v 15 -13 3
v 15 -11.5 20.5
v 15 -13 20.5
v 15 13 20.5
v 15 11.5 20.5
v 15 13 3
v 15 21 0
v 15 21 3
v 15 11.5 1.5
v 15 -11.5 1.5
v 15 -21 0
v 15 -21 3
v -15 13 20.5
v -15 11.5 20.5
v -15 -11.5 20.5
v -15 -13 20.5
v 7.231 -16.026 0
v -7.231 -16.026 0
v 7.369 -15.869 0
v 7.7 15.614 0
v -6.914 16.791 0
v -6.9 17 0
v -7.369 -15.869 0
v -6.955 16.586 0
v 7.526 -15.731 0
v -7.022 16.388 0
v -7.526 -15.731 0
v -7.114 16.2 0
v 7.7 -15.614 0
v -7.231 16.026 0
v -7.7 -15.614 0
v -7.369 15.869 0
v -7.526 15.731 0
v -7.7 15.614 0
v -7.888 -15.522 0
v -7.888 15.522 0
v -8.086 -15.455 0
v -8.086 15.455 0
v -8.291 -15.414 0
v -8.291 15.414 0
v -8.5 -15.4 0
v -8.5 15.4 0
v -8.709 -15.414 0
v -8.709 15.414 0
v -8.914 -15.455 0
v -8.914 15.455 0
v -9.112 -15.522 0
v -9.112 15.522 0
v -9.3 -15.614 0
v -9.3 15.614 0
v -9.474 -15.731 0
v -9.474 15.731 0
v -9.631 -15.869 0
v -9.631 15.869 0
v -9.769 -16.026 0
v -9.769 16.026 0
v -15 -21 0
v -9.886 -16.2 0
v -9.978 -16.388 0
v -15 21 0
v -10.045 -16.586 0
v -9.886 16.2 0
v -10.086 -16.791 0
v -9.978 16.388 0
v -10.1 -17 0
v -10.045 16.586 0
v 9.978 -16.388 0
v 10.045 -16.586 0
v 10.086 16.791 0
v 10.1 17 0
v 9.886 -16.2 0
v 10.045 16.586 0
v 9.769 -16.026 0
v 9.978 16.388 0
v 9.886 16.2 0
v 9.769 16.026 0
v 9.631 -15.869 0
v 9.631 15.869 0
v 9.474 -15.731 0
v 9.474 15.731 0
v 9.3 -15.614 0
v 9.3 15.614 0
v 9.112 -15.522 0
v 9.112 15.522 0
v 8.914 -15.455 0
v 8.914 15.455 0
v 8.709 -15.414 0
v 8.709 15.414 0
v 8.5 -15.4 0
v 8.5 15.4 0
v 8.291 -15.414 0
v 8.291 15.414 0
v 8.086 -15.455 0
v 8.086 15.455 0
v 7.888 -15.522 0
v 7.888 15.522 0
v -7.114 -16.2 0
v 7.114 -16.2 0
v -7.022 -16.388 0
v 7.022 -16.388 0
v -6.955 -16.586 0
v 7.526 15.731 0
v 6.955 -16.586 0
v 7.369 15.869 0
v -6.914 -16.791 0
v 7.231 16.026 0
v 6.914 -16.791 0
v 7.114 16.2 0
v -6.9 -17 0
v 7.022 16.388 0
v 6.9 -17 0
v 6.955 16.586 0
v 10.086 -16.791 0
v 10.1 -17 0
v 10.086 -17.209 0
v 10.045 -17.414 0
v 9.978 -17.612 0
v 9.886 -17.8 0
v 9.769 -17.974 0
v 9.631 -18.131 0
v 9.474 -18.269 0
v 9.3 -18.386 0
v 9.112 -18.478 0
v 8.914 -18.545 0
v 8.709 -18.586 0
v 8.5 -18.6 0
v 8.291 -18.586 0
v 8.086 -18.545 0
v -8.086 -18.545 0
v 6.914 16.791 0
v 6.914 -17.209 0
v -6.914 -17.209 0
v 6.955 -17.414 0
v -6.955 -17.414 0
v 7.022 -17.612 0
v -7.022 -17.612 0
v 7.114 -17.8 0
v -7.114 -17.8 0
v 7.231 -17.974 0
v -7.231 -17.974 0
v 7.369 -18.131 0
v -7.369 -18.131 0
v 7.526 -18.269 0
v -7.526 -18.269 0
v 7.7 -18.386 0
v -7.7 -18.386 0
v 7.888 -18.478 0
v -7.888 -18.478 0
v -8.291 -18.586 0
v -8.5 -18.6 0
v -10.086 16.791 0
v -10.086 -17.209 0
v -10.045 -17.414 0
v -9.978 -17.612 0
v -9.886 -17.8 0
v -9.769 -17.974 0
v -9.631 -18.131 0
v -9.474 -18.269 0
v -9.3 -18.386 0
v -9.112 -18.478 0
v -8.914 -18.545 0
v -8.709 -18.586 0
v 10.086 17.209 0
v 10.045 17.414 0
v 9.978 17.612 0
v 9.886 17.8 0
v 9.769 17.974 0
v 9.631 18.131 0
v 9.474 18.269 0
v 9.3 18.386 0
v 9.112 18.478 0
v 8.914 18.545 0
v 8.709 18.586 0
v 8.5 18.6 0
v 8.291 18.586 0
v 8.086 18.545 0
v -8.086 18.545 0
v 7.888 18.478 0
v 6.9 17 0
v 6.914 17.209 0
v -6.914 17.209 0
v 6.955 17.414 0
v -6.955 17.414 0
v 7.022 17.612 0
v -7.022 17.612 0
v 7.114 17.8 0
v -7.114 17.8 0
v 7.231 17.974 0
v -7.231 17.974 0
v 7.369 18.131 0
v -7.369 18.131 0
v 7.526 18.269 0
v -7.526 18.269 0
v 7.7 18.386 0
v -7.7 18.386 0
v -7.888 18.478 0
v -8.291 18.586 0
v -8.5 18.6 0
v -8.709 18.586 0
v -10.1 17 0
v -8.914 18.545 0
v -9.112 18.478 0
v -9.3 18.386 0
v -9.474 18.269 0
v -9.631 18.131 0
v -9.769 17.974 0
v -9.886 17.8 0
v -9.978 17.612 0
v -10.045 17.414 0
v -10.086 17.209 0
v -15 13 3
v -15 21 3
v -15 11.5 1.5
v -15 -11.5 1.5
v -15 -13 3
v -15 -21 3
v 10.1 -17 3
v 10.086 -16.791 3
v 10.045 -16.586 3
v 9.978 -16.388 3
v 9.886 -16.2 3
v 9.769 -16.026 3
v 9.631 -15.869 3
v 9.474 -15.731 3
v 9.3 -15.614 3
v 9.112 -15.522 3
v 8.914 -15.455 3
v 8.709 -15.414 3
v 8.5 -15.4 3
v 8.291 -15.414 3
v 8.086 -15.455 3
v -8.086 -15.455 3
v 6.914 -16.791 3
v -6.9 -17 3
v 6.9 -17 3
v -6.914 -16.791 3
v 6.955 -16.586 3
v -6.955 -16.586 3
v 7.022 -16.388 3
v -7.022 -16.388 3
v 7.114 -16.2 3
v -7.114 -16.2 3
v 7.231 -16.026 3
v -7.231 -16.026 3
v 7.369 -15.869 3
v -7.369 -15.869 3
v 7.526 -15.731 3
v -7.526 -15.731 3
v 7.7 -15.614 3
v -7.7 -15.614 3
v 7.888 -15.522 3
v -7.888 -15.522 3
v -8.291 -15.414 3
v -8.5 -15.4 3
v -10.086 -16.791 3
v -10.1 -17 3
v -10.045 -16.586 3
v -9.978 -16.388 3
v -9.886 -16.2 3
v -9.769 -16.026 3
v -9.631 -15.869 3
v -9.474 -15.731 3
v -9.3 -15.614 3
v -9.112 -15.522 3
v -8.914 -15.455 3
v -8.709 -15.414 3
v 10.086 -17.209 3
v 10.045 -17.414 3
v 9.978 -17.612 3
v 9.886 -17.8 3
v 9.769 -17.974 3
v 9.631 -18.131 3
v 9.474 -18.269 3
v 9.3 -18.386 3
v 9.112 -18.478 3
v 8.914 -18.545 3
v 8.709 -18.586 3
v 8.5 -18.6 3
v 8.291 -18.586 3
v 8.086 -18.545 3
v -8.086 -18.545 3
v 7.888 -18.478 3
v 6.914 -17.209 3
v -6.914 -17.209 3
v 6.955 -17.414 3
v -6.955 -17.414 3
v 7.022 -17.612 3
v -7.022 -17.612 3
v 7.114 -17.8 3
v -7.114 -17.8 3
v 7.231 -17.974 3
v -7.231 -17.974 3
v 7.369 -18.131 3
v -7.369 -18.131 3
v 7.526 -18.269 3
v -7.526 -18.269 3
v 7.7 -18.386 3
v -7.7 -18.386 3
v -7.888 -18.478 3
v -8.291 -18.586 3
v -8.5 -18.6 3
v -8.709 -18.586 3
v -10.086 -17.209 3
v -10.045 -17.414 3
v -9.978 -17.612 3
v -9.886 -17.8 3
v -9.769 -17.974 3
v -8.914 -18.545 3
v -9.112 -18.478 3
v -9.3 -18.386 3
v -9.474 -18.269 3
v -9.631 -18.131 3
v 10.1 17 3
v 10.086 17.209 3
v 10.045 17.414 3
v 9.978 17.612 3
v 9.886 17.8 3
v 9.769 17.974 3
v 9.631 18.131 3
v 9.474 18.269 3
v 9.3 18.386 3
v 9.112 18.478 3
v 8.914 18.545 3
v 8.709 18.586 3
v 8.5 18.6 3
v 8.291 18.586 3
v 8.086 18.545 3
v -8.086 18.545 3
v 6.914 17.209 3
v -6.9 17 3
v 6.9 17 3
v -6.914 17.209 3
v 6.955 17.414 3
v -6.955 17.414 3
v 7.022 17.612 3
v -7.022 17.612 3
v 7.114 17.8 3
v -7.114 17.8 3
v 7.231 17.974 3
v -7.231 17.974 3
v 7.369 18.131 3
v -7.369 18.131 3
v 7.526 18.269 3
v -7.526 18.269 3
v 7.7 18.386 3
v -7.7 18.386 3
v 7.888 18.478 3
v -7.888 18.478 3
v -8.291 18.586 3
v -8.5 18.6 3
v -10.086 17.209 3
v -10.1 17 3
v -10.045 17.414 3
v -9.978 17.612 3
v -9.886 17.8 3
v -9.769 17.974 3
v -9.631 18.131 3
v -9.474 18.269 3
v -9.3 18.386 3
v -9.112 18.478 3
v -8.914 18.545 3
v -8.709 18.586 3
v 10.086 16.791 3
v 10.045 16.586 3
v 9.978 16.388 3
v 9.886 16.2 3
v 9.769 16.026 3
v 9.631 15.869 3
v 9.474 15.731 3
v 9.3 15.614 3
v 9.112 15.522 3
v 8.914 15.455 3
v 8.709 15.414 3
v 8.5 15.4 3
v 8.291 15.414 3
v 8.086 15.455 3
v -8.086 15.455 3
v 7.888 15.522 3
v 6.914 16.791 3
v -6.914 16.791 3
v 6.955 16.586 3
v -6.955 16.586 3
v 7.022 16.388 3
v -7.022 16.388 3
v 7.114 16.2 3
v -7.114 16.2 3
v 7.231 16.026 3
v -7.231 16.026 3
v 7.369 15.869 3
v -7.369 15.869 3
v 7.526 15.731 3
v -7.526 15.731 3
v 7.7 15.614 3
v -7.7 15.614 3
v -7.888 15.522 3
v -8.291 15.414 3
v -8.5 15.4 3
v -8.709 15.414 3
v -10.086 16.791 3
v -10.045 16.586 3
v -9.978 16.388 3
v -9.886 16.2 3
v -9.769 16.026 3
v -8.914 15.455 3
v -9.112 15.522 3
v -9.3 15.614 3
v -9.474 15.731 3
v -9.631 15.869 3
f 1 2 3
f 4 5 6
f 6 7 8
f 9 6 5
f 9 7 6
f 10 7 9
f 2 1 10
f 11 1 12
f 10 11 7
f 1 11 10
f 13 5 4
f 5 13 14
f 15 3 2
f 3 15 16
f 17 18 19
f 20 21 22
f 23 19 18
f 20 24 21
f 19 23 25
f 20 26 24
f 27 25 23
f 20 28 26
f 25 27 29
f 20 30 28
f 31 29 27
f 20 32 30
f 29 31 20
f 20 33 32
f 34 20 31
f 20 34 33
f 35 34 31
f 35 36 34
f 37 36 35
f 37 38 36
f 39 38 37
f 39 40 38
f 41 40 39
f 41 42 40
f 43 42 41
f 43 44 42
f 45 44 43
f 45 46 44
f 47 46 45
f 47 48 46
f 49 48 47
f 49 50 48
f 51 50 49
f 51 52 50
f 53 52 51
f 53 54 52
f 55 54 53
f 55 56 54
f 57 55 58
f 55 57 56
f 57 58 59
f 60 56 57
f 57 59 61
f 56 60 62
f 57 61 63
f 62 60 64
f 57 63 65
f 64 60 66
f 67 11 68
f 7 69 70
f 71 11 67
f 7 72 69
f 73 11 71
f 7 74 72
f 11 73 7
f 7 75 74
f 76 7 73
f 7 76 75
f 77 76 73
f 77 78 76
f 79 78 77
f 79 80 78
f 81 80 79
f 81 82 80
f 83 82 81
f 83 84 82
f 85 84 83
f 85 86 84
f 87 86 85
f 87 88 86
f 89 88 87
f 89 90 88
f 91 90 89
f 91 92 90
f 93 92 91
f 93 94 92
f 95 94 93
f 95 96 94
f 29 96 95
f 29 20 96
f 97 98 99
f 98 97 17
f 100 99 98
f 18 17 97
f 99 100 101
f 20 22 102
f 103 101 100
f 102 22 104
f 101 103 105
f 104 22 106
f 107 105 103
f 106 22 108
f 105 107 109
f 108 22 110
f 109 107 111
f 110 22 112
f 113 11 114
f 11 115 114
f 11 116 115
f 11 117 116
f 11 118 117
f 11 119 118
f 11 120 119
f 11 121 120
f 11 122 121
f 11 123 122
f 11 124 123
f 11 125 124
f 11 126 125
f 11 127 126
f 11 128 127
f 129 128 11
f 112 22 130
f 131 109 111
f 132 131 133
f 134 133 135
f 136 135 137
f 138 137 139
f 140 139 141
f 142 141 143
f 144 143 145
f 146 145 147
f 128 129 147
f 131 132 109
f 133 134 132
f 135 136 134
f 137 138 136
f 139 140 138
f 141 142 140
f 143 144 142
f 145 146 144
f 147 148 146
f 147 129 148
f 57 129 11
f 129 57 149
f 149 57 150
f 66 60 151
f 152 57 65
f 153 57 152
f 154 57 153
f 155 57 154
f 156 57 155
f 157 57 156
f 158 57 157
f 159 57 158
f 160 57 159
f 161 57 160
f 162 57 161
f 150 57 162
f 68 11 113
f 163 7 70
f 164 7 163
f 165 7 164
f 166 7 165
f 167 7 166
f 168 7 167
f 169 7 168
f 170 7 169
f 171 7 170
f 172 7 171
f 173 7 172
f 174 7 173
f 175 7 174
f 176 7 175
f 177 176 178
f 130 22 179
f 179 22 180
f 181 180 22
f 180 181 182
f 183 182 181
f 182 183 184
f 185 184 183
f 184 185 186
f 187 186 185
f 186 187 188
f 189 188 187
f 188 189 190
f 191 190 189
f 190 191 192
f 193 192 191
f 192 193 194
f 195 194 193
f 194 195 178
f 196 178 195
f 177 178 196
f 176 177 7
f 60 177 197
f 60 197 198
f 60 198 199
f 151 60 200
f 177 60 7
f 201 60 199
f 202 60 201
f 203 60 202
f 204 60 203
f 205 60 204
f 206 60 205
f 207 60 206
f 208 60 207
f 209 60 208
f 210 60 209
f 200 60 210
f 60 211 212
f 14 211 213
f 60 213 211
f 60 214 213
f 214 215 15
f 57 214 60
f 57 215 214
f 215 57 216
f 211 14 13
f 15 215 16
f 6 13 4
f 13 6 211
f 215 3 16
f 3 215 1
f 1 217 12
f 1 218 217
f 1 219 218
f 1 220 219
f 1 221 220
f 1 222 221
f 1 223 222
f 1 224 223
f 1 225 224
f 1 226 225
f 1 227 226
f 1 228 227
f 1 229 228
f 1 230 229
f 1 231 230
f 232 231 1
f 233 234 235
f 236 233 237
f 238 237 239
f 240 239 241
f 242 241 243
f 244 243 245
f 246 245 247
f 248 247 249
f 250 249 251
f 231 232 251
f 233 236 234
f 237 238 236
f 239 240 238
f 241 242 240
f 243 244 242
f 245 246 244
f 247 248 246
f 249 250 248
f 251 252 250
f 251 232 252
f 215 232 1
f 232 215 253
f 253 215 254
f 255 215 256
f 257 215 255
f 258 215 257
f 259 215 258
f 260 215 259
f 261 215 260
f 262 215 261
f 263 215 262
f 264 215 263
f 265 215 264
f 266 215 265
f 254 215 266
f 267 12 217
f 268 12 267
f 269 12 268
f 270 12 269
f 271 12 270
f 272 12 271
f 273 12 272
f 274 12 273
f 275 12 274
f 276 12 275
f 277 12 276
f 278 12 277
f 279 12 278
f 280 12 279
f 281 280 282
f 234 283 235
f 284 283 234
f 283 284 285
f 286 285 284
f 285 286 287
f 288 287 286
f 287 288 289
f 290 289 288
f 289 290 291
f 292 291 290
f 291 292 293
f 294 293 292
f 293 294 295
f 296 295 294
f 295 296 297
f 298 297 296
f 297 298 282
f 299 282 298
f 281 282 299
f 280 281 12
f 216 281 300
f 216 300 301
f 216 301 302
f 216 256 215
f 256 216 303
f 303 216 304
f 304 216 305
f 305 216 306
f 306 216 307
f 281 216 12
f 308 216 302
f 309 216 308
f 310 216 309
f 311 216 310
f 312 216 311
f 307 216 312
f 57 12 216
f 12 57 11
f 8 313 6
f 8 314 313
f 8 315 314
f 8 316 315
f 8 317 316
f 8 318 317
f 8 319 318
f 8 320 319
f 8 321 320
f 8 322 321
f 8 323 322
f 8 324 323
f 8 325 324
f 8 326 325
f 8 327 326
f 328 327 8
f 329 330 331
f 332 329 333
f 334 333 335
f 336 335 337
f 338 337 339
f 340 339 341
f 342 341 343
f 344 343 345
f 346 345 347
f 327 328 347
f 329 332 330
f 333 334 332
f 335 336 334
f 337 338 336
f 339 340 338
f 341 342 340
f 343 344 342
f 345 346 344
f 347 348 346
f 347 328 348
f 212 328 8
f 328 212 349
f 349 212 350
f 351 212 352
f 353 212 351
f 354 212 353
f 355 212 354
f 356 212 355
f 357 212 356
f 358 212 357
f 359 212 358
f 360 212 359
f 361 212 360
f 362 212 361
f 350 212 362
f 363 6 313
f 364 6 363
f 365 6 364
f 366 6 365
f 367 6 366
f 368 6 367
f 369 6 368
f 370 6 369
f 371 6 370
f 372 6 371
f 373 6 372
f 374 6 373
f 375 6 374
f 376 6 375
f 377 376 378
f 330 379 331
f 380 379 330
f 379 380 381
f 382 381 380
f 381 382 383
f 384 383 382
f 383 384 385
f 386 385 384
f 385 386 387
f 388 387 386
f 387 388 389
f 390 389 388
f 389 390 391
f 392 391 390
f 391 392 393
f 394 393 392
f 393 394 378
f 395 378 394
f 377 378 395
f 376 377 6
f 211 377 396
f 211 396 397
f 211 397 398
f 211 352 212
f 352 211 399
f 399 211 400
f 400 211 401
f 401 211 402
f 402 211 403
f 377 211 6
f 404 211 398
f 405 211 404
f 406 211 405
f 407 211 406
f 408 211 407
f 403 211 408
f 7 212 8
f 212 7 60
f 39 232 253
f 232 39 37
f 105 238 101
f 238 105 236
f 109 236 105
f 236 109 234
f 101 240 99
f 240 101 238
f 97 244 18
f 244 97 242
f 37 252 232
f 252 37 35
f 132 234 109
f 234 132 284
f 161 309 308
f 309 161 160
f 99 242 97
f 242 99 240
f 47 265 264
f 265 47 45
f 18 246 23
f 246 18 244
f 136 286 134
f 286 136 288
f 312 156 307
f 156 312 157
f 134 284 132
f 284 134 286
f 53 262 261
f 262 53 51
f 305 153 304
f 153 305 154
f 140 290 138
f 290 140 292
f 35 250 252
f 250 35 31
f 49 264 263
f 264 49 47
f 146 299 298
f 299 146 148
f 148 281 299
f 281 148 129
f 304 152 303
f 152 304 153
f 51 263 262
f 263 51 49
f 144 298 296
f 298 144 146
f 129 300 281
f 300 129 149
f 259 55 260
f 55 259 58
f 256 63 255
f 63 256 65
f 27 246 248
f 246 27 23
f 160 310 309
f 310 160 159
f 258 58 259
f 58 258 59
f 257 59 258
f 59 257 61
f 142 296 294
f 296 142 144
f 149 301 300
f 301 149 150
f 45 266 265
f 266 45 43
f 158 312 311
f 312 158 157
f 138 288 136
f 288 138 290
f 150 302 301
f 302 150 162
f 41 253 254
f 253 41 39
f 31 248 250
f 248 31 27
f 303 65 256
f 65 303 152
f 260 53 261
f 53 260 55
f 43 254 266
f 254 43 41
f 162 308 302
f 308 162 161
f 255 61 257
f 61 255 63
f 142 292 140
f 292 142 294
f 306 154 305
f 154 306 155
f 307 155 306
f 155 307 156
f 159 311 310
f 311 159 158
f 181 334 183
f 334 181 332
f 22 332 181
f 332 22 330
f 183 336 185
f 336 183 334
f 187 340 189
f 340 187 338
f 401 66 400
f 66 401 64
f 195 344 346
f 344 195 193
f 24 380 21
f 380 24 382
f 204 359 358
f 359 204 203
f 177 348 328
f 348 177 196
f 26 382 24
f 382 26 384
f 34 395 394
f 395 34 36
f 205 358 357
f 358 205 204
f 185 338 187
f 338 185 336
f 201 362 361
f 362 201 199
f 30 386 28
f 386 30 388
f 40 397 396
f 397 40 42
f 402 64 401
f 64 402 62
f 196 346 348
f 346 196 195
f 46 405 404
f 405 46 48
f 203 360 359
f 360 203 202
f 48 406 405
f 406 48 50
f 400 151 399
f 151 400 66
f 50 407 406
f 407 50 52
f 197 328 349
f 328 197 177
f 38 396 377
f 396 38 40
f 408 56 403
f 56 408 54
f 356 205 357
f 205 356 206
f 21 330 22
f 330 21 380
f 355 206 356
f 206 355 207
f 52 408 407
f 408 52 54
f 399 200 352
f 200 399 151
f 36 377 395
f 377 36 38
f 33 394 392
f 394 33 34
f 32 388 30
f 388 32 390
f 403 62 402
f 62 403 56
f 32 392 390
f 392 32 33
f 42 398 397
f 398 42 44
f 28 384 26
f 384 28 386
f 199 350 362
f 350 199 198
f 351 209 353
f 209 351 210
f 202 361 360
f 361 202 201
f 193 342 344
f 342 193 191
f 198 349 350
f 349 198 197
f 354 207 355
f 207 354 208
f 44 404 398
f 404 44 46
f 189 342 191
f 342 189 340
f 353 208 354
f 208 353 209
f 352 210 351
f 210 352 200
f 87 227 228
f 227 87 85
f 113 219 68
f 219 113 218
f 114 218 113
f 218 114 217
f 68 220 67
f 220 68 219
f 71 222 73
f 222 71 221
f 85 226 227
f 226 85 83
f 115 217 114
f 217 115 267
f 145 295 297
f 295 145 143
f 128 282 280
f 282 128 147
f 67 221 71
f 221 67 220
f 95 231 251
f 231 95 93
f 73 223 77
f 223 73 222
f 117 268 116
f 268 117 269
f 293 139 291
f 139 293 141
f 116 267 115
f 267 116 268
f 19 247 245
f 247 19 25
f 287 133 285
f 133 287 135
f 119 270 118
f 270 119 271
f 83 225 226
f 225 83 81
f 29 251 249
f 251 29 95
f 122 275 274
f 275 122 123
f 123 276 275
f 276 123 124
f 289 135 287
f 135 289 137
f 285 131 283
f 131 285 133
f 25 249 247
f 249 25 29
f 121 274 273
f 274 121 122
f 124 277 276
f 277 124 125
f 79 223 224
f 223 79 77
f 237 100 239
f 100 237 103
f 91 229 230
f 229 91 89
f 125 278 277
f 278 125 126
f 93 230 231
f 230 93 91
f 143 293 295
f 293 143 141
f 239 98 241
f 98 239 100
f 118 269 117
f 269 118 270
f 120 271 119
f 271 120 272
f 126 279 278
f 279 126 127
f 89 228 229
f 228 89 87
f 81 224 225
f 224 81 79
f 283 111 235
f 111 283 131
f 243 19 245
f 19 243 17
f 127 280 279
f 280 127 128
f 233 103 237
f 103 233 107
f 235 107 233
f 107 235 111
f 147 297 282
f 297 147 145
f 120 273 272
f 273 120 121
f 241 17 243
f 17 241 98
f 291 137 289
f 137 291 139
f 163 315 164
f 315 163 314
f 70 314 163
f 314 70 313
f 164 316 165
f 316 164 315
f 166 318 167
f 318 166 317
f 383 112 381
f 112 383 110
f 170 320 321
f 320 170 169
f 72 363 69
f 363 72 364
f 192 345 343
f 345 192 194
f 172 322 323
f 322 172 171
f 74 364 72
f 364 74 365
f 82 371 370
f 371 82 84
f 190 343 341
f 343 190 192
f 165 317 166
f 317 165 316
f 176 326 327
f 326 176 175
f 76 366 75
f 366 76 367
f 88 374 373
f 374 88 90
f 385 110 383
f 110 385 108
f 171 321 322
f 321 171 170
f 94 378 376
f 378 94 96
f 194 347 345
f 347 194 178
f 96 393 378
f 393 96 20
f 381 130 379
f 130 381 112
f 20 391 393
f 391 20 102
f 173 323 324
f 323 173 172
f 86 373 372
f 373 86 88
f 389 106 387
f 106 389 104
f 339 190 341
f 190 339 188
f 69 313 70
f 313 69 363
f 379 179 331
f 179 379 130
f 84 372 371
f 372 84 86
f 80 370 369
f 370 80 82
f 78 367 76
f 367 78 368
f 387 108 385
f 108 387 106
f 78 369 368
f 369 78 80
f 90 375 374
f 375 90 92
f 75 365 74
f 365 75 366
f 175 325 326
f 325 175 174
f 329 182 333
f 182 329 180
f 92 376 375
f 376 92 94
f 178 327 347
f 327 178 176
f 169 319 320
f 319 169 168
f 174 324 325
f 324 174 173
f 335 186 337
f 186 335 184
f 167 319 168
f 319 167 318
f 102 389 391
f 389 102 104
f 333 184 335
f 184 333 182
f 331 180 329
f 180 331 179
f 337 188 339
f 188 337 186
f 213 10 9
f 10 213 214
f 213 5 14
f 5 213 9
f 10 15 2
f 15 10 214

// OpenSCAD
// EvoBot reference-01 — TT Motor Mount Clip (print 2x)
// Open in OpenSCAD → Render (F6) → Export STL (F7)

// Parametric dimensions (mm)
channel_w   = 23;   // inside width
channel_h   = 19;   // inside height (depth of U)
wall        = 1.5;  // wall thickness
clip_len    = 30; // length along motor body
tab_w       = 8;   // bolt tab width
tab_t       = 3; // bolt tab thickness
hole_span   = 17; // M3 hole spacing
hole_dia    = 3.2; // M3 clearance

$fn = 48;

module motor_mount() {
    outer_w = channel_w + 2*wall;
    total_w = outer_w + 2*tab_w;
    total_h = channel_h + wall;

    difference() {
        union() {
            // U-channel body
            translate([-clip_len/2, -outer_w/2, 0])
                cube([clip_len, outer_w, total_h]);
            // Left tab
            translate([-clip_len/2, -total_w/2, 0])
                cube([clip_len, tab_w, tab_t]);
            // Right tab
            translate([-clip_len/2, outer_w/2, 0])
                cube([clip_len, tab_w, tab_t]);
        }
        // Channel cutout (open top)
        translate([-clip_len/2 - 1, -channel_w/2, wall])
            cube([clip_len + 2, channel_w, channel_h + 1]);
        // M3 bolt holes (4 total, 2 per side)
        for (sx = [-1, 1])
            for (sy = [-1, 1])
                translate([sx * hole_span/2, sy * (outer_w/2 + tab_w/2), -1])
                    cylinder(d=hole_dia, h=tab_t + 2);
    }
}

motor_mount();
